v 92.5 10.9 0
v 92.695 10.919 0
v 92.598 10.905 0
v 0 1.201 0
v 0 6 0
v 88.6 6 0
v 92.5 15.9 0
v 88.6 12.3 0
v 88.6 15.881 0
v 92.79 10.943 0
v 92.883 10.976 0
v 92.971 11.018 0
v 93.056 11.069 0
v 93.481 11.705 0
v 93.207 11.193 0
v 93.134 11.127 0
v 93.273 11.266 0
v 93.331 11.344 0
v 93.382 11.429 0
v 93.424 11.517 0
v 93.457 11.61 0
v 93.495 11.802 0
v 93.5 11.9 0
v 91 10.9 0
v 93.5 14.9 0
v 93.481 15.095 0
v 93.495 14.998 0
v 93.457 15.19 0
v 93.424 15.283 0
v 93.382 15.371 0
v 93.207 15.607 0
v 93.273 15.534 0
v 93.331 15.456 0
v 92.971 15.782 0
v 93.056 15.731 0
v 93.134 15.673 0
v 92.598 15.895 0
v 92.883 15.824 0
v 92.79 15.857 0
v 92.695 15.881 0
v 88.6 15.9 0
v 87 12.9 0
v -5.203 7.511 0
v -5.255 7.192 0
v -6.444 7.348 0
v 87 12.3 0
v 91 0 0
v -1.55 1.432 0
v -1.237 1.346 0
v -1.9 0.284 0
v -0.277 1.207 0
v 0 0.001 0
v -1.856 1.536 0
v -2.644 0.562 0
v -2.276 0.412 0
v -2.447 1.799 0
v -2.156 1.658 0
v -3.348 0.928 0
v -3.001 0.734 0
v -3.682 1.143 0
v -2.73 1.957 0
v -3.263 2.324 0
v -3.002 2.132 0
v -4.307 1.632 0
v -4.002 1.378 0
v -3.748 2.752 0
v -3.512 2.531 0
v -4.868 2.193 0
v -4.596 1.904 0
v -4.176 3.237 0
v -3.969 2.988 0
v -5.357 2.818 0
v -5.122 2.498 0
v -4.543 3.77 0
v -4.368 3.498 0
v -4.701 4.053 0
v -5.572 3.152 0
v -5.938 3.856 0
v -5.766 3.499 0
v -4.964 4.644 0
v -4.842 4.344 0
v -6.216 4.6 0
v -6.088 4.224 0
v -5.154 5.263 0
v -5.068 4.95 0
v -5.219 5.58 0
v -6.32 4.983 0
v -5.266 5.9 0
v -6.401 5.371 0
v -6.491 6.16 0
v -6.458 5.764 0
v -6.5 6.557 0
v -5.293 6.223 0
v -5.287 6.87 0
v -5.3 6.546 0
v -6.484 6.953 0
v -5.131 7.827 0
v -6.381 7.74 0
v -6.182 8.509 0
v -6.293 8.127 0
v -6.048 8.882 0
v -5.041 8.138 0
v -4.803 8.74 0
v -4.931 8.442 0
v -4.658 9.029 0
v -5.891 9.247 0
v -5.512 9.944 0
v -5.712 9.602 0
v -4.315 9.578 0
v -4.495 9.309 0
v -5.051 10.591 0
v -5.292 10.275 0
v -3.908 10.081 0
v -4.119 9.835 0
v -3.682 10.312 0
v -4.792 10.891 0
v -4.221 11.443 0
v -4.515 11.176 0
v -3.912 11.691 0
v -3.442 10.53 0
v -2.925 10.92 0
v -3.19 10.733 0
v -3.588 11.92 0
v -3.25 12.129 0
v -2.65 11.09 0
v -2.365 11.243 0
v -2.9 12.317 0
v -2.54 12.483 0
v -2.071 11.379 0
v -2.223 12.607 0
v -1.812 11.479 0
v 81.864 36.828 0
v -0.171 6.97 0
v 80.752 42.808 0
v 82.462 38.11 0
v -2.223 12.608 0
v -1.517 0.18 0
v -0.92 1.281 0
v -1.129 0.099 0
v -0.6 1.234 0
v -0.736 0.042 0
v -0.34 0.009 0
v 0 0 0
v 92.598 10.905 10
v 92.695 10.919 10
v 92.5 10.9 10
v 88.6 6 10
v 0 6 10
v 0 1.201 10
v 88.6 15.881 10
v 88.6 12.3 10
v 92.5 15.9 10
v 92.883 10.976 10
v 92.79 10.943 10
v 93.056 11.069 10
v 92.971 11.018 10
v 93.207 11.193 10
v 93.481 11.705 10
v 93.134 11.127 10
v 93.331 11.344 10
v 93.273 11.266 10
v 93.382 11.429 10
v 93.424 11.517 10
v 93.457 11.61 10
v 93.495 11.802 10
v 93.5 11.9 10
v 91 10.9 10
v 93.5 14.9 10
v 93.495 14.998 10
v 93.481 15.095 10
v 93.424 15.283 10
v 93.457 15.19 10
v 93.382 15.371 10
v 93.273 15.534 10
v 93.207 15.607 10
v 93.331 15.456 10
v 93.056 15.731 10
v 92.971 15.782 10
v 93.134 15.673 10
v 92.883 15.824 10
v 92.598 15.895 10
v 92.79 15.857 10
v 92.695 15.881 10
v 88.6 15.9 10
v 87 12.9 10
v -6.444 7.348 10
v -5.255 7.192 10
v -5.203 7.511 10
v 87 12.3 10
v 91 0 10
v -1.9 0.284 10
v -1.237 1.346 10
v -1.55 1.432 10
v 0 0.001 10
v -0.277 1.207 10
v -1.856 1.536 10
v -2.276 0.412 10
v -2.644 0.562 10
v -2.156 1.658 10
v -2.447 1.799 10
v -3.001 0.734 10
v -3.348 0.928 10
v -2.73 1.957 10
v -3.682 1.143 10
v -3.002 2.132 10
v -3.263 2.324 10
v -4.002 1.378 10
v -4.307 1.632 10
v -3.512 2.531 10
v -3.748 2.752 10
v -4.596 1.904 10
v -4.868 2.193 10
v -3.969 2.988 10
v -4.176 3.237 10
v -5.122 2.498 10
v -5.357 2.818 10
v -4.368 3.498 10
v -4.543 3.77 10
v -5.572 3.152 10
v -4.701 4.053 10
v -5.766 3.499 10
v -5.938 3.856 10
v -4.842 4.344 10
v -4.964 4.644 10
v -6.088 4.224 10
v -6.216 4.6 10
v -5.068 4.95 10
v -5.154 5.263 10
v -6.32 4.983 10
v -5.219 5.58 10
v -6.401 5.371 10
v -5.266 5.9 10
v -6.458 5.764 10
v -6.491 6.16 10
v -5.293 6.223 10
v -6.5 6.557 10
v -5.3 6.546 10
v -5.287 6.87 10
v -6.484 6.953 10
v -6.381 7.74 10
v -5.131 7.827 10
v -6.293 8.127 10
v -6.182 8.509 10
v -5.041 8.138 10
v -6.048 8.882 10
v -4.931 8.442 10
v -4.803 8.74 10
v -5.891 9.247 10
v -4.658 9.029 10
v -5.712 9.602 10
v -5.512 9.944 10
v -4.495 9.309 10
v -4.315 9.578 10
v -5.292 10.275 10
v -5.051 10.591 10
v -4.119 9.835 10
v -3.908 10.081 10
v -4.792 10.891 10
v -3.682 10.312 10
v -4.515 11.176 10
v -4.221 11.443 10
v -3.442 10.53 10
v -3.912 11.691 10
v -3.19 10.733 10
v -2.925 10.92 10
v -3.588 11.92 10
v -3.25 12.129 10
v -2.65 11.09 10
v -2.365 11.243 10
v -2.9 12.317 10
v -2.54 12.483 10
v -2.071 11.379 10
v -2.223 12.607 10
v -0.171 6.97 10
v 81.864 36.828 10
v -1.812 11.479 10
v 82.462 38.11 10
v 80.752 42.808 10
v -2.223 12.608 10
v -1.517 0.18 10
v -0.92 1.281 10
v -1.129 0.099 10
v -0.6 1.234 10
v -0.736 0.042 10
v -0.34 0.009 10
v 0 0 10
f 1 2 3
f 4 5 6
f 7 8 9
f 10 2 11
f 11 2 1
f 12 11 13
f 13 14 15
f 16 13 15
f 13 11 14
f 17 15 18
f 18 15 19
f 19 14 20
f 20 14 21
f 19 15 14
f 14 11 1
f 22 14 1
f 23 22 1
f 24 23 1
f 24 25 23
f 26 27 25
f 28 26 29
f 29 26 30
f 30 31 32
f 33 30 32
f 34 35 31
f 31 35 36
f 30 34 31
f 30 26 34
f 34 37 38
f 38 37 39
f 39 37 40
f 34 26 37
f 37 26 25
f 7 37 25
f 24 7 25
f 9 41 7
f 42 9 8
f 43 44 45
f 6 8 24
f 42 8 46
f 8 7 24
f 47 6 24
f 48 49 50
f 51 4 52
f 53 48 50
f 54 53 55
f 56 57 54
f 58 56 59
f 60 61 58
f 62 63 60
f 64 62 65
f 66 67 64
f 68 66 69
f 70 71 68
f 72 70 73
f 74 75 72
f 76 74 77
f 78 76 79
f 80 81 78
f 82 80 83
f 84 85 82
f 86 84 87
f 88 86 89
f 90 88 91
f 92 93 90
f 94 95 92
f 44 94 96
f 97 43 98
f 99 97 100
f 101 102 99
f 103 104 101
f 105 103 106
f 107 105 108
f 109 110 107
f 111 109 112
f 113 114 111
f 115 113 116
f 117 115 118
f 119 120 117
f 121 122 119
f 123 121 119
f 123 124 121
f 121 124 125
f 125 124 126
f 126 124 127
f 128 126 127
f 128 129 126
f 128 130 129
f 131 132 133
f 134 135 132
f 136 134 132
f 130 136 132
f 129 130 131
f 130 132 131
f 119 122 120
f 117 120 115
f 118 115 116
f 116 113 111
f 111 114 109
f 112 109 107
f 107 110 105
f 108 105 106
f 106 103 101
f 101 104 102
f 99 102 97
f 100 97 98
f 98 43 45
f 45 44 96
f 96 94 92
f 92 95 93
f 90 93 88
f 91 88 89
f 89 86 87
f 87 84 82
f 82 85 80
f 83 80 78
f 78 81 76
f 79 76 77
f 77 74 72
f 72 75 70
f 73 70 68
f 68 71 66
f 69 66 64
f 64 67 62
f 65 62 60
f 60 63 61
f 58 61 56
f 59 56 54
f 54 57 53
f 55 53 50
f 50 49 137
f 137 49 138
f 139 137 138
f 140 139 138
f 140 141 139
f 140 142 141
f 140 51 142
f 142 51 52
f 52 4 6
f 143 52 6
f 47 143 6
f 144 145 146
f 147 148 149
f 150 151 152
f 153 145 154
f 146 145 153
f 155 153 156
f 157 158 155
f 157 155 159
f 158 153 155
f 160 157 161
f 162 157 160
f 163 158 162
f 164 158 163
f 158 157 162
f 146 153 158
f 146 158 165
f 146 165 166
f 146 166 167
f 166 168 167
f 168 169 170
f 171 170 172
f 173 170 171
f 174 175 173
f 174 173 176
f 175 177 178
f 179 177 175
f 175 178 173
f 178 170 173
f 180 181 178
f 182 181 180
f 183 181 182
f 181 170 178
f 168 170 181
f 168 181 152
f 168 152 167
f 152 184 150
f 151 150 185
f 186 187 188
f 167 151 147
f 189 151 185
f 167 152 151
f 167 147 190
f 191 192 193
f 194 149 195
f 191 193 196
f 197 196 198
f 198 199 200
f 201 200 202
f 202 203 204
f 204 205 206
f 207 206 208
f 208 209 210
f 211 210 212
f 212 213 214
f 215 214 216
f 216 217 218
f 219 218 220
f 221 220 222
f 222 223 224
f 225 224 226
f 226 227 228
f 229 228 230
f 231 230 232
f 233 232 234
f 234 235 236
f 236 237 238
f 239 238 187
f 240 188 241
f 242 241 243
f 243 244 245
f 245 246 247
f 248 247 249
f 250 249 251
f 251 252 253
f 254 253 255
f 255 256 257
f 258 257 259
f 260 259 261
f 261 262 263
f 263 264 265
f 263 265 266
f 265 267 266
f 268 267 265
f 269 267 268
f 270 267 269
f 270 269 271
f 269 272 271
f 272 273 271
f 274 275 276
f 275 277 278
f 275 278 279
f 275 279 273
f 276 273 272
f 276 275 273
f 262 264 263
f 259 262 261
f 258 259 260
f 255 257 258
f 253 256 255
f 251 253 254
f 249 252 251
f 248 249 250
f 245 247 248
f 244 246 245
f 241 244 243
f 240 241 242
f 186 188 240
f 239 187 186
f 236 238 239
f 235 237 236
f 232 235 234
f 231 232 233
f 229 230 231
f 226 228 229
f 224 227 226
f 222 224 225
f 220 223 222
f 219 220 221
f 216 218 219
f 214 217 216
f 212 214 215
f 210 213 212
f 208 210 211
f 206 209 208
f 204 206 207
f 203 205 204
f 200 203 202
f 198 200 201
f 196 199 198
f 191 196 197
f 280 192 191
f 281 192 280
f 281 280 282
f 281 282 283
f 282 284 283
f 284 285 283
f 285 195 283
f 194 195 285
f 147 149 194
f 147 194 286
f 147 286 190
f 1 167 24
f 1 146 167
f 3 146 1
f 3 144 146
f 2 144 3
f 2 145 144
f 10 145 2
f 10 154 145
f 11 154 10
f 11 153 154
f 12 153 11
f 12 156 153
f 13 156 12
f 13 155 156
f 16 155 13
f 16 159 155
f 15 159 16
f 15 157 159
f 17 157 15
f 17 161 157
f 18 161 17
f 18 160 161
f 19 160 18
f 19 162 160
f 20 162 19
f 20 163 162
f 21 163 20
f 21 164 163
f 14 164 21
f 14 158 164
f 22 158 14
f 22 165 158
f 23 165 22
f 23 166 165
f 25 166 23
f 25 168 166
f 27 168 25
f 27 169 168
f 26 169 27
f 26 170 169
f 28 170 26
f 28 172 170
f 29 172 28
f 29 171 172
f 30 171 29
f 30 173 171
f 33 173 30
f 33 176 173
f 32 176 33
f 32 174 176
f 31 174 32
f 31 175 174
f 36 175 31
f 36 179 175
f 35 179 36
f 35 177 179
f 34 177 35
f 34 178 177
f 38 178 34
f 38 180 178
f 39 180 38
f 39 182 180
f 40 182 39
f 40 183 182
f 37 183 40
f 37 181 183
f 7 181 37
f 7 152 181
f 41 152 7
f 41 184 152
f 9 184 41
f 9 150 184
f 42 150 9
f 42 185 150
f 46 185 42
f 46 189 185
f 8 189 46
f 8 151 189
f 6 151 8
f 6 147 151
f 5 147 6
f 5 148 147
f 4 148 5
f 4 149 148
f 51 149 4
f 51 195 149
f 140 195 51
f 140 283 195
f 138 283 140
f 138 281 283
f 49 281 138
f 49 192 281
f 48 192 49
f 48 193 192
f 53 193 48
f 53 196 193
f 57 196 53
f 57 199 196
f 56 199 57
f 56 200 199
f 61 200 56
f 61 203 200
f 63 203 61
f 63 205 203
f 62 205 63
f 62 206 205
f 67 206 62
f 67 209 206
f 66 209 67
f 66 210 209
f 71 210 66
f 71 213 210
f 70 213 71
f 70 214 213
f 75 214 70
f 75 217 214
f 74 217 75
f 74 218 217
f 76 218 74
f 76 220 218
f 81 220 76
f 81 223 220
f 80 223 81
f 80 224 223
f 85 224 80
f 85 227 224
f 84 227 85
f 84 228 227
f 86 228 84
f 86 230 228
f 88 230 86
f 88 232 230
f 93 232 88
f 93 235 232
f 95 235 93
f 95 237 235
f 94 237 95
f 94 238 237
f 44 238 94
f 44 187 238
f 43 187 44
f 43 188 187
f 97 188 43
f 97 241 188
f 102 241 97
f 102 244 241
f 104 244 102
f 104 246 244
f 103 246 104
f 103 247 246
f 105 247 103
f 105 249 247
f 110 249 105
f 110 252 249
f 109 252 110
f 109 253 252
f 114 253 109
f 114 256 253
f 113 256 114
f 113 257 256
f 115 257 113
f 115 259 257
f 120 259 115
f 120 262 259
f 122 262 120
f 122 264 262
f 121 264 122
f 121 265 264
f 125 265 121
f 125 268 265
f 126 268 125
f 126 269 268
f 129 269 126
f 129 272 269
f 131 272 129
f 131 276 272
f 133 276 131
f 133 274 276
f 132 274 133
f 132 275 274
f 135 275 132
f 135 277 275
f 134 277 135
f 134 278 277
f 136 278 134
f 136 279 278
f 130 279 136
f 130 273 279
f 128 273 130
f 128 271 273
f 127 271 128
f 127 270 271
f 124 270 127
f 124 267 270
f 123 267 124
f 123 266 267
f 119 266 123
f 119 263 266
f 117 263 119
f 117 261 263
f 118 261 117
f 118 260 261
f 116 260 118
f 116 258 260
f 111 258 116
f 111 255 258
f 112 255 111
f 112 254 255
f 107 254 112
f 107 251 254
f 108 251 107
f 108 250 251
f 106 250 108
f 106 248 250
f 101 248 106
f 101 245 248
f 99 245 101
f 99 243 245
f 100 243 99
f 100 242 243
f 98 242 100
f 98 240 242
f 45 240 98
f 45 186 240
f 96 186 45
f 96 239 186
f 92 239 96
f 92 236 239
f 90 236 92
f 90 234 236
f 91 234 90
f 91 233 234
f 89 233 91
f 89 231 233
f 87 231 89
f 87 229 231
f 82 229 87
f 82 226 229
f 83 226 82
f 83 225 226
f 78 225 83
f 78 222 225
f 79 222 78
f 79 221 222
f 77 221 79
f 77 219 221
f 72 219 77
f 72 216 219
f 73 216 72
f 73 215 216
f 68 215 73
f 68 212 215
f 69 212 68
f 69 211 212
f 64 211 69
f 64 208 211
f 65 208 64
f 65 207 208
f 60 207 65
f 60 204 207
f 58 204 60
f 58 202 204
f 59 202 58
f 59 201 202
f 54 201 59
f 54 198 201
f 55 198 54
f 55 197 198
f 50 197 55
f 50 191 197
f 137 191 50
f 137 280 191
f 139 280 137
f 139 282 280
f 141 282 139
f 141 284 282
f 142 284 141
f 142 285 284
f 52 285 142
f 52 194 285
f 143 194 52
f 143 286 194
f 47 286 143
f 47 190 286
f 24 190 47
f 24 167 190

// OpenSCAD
// Bag clip — one piece, printed flat and open. A thin flexure loop at one end
// joins the two arms; at the other end the lower arm turns up into a post with
// a hook lip that snaps over the tip of the upper arm. Squeeze the arms
// together until the tip clicks under the lip; push the tab on the post
// outwards to release.
//
// The arms are drawn in their closed position and the upper arm is then
// swung open by open_angle about the centre of the loop, which is how the
// part prints: the loop is relaxed when open and bends when latched.
//
// Written to the MakerWorld Parametric Model Maker customizer conventions so
// the same file works unchanged on MakerWorld and in ScadBuddy.
//
// The colour parameters are the extruder order: clip_color is extruder 1,
// text_color is extruder 2 (only used when text is set).

/* [Clip] */

// Overall length of the closed clip, loop to latch tab
length = 100; // [50:5:200]

// Width of the arms across the bag — this is the print height
width = 10; // [8:1:20]

// Thickness of each arm
thickness = 6; // [4:0.5:10]

// Thickness of the flexure loop that acts as the hinge
hinge_t = 1.2; // [0.8:0.1:2]

// Play between the hook lip and the tip of the upper arm when latched
latch_tol = 0.3; // [0.1:0.05:0.6]

// Jaw faces: flat, or interlocking waves that grip better
style = "flat"; // [flat:Flat, wave_grip:Wave grip]

/* [Text] */

// Text raised on the top face of the lower arm (empty for none)
text = ""; // 24

// Typeface
font = "DejaVu Sans:style=Bold"; // font

/* [Colors] */

// Clip colour (extruder 1)
clip_color = "#F2B705"; // color

// Text colour (extruder 2)
text_color = "#1E1E1E"; // color

/* [Hidden] */

$fn = 64;

// How far the upper arm is swung open for printing, in degrees.
open_angle = 20;

// Gap between the jaws at the loop when closed. Also keeps the arms from
// fusing next to the loop while printing open.
pivot_gap = 1.0;

// Hook lip: how far it reaches back over the upper arm, and its thickness.
lip_len = 1.6;
lip_t = 2;

// Latch post thickness, and the release tab on its outside.
post_w = 2.4;
tab_w = 2.5;
tab_h = 5;

// Wave grip: amplitude and pitch of the jaw waves.
wave_amp = 0.8;
wave_pitch = 4;

// Raised text height.
text_h = 0.6;

t = thickness;
g = pivot_gap;
R = t + g / 2;                          // loop outer radius
C = [0, t + g / 2];                     // loop centre = pivot
L = length - R - post_w - tab_w;        // lower arm, loop face to post
Lu = L - latch_tol;                     // upper arm length
y_lip = 2 * t + latch_tol;              // underside of the hook lip
y_top = y_lip + lip_t + lip_len;        // top of the post
wave = style == "wave_grip";

// Jaw wave region: starts far enough from the loop that the open arms stay
// clear of each other, stops short of the latch; whole periods only.
wx0 = (2 * wave_amp + 1) / tan(open_angle) + 2;
wn = max(0, floor((Lu - 4 - wx0) / wave_pitch));
wx1 = wx0 + wn * wave_pitch;

function wave_y(x) = (wave && wn > 0 && x > wx0 && x < wx1)
    ? wave_amp * sin(360 * (x - wx0) / wave_pitch) : 0;

// Sample points along a jaw face, left to right.
function jaw_xs(x_end) = wave && wn > 0
    ? concat([0], [for (i = [0 : wn * 16]) wx0 + i * wave_pitch / 16], [x_end])
    : [0, x_end];

module lower_arm_2d() {
    xs = jaw_xs(L);
    polygon(concat([[0, 0], [L, 0]],
                   [for (i = [len(xs) - 1 : -1 : 0]) [xs[i], t + wave_y(xs[i])]]));
}

// Upper arm in its closed position, with a lead-in chamfer on the corner of
// the tip that meets the hook lip.
module upper_arm_2d() {
    xs = jaw_xs(Lu - 1);
    polygon(concat([for (x = xs) [x, t + g + wave_y(x)]],
                   [[Lu, t + g + 1], [Lu, 2 * t + g], [0, 2 * t + g]]));
}

// Thin loop from the lower arm round the back to the (opened) upper arm.
// Runs a few degrees into each arm so the joints are solid.
module loop_2d() {
    a0 = 90 + open_angle - 4;
    a1 = 274;
    n = 48;
    translate(C) polygon(concat(
        [for (i = [0 : n]) R * [cos(a0 + (a1 - a0) * i / n), sin(a0 + (a1 - a0) * i / n)]],
        [for (i = [n : -1 : 0]) (R - hinge_t) * [cos(a0 + (a1 - a0) * i / n), sin(a0 + (a1 - a0) * i / n)]]));
}

// Post, hook lip with a sloped top as a lead-in, and the release tab.
module latch_2d() {
    translate([L, 0]) square([post_w, y_top]);
    polygon([[L - lip_len, y_lip], [L + 0.01, y_lip],
             [L + 0.01, y_top], [L - lip_len, y_lip + 0.6]]);
    r = 1;
    hull() for (x = [L + post_w - 0.01, L + post_w + tab_w - r])
        for (y = [y_top - tab_h + r, y_top - r])
            translate([x, y]) circle(r = r);
}

module clip_2d() {
    lower_arm_2d();
    latch_2d();
    loop_2d();
    translate(C) rotate(open_angle) translate(-C) upper_arm_2d();
}

// Text band on the lower arm, clear of the waves and of the loop and latch.
band_y0 = 0.8;
band_y1 = t - (wave ? wave_amp : 0) - 0.8;
band_x0 = 3;
band_x1 = L - lip_len - 2;
n_chars = len(text);
text_size = n_chars == 0 ? 0
    : min((band_y1 - band_y0) * 0.95, (band_x1 - band_x0) / (n_chars * 0.72));

color(clip_color)
    linear_extrude(height = width)
        clip_2d();

if (n_chars > 0)
    color(text_color)
        translate([0, 0, width])
            linear_extrude(height = text_h)
                intersection() {
                    translate([(band_x0 + band_x1) / 2, (band_y0 + band_y1) / 2])
                        text(text, size = text_size, font = font,
                             halign = "center", valign = "center");
                    translate([band_x0, band_y0])
                        square([band_x1 - band_x0, band_y1 - band_y0]);
                }
